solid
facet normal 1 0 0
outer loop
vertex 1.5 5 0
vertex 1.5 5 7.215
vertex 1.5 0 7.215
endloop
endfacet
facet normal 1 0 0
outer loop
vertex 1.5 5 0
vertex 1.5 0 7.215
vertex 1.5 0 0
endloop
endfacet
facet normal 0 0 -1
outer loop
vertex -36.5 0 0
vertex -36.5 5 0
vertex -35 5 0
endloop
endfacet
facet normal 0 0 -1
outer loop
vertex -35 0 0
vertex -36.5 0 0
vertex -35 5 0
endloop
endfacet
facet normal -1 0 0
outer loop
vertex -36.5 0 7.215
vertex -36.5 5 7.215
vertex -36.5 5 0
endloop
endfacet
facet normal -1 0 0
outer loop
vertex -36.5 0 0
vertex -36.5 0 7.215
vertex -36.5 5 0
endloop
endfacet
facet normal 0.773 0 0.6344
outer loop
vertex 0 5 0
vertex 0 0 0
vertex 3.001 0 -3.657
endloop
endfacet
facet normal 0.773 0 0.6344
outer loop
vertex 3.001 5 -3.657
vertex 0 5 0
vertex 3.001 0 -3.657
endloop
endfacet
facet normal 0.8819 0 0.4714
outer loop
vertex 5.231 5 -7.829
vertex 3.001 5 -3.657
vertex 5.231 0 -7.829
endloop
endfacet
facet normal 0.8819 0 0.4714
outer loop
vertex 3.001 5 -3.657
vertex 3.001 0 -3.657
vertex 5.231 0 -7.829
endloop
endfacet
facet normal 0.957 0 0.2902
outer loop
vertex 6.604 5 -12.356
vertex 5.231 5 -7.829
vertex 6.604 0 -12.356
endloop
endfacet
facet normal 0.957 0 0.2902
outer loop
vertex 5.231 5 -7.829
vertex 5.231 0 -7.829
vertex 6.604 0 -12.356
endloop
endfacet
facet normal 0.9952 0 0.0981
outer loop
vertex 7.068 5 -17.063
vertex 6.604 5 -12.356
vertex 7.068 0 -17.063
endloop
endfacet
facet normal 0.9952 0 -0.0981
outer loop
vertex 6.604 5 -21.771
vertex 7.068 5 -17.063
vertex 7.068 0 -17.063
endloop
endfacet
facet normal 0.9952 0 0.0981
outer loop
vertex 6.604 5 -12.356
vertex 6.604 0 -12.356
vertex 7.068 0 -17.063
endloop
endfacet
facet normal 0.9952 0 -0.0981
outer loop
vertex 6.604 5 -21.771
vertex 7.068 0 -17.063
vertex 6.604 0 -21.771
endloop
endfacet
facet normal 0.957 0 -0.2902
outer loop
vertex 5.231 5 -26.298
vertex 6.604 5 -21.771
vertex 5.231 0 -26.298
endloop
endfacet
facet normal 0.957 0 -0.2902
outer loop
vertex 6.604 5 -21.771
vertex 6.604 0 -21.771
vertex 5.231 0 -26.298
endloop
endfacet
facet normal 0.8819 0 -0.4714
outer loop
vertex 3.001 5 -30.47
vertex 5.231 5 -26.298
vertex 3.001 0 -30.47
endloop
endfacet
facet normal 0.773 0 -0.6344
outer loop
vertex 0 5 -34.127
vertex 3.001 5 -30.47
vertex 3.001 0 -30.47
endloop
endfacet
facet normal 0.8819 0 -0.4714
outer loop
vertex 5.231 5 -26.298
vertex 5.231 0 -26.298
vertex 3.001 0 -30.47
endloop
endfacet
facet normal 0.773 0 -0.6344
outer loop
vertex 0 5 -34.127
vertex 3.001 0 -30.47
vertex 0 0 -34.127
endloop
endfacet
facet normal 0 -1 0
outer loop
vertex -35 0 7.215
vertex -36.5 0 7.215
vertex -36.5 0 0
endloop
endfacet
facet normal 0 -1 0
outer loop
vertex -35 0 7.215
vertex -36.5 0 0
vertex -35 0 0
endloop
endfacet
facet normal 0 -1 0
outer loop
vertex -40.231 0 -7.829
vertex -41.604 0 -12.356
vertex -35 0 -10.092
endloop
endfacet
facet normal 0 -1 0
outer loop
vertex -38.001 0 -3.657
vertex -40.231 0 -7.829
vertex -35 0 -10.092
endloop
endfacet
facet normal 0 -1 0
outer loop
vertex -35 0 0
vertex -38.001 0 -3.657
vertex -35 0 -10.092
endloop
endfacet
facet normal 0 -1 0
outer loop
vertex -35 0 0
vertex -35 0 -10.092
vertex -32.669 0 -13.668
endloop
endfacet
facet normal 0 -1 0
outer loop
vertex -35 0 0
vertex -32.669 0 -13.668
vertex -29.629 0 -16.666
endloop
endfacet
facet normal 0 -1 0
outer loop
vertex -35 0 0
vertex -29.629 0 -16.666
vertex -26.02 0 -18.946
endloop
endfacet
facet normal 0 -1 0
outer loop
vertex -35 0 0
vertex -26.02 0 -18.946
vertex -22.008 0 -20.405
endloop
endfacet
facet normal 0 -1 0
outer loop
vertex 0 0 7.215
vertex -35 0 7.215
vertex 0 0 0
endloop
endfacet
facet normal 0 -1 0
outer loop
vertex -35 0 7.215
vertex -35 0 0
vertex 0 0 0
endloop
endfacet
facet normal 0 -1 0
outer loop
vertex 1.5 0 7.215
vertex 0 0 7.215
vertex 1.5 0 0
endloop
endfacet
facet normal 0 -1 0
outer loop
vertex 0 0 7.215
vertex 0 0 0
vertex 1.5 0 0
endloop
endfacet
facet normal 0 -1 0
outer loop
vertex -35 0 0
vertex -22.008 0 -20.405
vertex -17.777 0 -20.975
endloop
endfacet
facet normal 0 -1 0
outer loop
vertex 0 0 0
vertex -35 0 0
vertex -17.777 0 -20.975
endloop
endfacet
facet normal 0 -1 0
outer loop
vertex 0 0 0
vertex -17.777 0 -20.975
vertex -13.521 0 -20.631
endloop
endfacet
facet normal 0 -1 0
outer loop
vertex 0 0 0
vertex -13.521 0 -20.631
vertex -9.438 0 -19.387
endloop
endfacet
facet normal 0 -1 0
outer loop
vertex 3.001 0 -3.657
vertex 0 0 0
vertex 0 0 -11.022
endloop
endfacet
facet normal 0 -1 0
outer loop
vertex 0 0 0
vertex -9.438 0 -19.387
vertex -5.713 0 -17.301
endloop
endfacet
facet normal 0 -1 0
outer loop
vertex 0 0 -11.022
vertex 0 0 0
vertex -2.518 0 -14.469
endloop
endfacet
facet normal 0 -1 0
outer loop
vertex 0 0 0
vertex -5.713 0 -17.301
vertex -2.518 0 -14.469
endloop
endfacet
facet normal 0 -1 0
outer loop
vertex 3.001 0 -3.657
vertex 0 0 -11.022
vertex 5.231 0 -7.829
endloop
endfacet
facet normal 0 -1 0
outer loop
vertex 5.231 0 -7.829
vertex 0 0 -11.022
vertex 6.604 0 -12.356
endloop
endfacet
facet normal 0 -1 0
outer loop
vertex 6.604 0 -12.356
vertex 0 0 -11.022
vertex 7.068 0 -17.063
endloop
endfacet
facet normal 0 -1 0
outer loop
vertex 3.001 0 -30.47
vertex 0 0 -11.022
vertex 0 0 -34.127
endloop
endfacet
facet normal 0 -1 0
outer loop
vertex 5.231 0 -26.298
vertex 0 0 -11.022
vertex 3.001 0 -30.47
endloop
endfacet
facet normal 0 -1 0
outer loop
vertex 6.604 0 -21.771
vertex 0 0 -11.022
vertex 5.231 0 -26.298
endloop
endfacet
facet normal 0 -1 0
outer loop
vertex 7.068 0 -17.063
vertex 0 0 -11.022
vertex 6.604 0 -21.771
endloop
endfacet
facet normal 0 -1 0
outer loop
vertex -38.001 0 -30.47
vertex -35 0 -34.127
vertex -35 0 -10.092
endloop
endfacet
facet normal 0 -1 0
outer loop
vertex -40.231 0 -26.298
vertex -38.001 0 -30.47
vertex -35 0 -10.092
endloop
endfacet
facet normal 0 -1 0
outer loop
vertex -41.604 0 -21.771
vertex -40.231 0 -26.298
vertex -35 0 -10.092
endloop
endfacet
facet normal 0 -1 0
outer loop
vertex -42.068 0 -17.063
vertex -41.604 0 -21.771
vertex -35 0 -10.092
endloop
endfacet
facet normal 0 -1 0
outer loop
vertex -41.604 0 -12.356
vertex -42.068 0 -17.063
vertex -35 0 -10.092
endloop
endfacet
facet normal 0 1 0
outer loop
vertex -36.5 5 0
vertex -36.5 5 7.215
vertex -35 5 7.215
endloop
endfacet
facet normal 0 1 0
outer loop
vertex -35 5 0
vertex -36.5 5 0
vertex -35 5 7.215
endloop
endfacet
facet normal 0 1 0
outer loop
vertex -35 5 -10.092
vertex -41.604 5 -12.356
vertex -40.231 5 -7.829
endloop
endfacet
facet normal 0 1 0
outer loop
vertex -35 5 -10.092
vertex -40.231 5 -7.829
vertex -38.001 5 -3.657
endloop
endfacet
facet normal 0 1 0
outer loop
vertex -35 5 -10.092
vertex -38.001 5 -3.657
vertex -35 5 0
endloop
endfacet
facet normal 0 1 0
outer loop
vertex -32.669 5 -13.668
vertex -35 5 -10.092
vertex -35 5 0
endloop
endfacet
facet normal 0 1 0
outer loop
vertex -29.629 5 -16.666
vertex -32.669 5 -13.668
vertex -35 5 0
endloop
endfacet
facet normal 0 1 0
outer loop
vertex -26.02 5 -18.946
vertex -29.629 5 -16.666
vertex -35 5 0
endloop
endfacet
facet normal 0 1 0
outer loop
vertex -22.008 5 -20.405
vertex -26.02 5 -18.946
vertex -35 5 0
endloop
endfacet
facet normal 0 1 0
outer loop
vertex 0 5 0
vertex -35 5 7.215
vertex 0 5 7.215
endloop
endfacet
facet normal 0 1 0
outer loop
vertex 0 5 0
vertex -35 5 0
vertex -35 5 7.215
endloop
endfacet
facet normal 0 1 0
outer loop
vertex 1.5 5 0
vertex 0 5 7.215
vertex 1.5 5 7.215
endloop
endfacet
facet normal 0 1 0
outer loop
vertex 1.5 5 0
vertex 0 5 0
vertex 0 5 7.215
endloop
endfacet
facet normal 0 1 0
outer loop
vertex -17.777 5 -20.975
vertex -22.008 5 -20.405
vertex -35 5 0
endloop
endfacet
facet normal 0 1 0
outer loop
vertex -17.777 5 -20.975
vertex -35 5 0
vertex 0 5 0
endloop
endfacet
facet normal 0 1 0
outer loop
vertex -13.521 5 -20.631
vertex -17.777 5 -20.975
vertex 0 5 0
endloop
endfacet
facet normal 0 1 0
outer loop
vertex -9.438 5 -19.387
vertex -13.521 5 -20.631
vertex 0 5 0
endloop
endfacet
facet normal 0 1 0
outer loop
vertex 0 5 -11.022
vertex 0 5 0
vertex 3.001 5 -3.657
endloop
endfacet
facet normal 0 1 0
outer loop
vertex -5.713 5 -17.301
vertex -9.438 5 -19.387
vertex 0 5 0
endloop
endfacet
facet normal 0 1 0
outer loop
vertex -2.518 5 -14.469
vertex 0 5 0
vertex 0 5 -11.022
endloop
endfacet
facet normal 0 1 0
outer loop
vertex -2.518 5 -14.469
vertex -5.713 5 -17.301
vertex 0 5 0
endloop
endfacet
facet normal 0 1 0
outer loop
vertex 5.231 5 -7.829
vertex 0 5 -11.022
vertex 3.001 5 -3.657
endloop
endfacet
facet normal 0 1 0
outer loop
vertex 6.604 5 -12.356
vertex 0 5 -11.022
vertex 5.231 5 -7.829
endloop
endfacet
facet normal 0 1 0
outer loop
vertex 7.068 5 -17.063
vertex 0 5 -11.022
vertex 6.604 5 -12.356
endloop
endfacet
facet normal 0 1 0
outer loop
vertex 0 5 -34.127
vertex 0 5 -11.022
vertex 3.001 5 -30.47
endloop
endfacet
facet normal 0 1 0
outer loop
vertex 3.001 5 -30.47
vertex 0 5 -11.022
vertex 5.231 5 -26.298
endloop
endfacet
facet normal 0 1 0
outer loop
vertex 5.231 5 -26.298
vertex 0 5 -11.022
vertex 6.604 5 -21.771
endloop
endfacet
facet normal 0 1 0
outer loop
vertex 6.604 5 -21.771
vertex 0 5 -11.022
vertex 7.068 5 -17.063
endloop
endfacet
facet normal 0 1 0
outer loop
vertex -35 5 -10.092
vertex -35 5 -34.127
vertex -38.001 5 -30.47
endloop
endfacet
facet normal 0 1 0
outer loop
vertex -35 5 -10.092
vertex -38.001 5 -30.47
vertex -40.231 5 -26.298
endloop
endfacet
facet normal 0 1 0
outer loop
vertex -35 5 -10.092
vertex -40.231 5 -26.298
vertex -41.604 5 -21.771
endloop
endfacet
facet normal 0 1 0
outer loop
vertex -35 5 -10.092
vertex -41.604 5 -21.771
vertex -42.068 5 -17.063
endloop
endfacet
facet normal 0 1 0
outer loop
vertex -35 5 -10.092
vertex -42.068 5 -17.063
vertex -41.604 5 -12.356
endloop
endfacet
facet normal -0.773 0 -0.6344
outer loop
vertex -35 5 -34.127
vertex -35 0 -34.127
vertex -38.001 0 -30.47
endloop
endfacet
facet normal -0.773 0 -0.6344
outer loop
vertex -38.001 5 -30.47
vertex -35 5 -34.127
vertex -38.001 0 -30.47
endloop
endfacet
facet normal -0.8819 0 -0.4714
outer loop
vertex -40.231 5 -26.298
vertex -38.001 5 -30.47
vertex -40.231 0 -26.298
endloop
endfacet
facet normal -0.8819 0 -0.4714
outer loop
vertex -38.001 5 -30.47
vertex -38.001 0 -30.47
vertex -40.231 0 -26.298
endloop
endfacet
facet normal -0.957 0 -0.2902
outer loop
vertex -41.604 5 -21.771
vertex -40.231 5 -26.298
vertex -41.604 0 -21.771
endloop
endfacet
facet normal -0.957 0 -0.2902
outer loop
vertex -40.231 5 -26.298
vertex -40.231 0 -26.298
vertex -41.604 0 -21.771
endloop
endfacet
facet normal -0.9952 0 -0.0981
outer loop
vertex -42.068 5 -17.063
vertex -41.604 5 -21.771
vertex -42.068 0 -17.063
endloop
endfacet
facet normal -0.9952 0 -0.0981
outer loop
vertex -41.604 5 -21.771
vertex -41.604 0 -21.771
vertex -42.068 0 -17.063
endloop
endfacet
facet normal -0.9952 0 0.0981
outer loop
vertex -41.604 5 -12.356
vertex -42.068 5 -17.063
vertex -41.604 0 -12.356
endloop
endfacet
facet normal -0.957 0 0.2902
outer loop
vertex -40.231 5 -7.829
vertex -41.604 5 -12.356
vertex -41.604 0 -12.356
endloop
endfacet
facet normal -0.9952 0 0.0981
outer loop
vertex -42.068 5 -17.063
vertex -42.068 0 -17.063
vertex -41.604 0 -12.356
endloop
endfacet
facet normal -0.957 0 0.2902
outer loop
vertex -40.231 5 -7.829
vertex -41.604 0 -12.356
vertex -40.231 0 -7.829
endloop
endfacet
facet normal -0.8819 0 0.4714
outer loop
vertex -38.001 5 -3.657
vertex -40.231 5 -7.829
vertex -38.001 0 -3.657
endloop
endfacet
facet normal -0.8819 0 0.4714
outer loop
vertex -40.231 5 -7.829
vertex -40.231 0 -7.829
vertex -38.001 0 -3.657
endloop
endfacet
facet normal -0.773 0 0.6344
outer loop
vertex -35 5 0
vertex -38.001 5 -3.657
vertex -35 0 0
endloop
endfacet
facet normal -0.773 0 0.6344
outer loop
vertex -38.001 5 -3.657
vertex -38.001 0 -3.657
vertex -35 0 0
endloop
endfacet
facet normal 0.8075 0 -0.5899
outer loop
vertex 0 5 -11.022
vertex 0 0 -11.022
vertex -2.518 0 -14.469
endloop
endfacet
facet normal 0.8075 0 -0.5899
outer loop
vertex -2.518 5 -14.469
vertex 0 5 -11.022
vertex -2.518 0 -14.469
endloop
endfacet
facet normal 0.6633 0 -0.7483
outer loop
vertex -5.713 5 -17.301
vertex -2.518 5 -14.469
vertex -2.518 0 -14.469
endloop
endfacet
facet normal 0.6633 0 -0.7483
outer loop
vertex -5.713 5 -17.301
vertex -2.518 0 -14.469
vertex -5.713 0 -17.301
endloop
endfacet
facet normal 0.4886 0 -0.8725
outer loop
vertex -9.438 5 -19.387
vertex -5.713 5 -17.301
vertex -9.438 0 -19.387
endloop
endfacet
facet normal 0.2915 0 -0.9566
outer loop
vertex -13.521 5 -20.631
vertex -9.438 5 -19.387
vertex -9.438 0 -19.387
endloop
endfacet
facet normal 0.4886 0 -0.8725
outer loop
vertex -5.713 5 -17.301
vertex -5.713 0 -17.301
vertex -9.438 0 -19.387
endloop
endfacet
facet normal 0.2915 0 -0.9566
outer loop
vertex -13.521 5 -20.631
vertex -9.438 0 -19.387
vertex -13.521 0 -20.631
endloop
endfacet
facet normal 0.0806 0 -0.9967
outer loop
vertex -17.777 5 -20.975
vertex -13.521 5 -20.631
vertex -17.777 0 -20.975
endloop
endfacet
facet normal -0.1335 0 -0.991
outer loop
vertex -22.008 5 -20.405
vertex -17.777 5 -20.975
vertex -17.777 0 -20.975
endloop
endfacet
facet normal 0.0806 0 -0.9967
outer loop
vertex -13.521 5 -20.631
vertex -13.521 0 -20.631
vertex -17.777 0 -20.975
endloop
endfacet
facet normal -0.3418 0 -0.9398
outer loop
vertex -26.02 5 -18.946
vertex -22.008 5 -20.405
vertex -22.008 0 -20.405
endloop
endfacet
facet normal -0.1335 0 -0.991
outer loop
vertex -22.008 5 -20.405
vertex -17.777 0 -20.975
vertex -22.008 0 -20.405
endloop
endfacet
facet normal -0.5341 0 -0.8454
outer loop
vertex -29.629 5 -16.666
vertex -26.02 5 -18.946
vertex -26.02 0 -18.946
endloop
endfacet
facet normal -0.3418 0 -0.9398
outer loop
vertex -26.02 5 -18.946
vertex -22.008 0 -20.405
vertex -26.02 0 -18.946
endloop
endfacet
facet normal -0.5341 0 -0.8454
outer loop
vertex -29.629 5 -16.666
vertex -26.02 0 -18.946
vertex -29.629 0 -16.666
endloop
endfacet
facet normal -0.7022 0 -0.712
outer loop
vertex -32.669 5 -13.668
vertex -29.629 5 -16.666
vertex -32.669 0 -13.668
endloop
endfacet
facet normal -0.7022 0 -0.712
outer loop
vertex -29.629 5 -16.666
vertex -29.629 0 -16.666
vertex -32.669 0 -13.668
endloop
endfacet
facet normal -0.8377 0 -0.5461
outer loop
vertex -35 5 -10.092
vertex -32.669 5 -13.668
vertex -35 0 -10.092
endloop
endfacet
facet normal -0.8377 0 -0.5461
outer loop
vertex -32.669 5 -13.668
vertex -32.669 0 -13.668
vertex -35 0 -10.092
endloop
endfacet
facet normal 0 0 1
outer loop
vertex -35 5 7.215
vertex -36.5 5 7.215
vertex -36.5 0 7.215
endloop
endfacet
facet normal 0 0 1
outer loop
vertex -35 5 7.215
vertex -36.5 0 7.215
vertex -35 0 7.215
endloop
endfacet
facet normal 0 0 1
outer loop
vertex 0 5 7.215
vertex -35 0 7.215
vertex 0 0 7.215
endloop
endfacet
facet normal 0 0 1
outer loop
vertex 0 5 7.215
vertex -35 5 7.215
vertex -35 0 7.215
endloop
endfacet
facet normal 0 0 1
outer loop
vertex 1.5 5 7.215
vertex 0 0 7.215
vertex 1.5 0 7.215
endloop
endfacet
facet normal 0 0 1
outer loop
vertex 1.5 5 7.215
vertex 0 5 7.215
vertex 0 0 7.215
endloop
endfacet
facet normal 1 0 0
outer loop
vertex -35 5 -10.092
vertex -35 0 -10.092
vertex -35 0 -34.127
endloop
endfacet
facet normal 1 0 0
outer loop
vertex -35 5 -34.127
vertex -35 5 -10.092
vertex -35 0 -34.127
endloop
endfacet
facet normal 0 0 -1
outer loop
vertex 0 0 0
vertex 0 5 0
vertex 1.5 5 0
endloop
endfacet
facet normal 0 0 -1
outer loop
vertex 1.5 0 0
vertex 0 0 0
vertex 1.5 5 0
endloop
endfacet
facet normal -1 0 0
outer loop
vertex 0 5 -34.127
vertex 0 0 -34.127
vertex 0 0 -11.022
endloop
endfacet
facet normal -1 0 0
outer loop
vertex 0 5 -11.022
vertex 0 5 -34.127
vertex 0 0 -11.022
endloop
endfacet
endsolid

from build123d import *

# Parameters (mm, degrees)
BOSS_EXTRUDE2_DEPTH = 5
BOSS_EXTRUDE3_START = -5
BOSS_EXTRUDE3_DEPTH = 5
SKETCH5_W           = 1.5
SKETCH5_H           = 7.215071269
BOSS_EXTRUDE4_DEPTH = 5


with BuildPart() as part:
    # Sketch1 → Boss-Extrude2 (new body)
    with BuildSketch(Plane(origin=(0, 0, 0), x_dir=(1, 0, 0), z_dir=(0, 1, 0))):
        with BuildLine():
            Line((-35, 10.092006525), (-35, 34.126916803))
            ThreePointArc((-35, 34.126916803), (-42.067915891, 17.063458401), (-35, 0))
            ThreePointArc((-35, 0), (-17.5, -2.732905818), (0, 0))
            ThreePointArc((0, 0), (7.067915891, 17.063458401), (0, 34.126916803))
            Line((0, 34.126916803), (0, 11.021533442))
            ThreePointArc((0, 11.021533442), (-17.776697358, 20.975411278), (-35, 10.092006525))
        make_face()
    extrude(amount=BOSS_EXTRUDE2_DEPTH)

    # Sketch4 → Boss-Extrude3 (add)
    with BuildSketch(Plane(origin=(0, 5, 0), x_dir=(1, 0, 0), z_dir=(0, 1, 0)).offset(BOSS_EXTRUDE3_START)):
        with BuildLine():
            Line((0, 0), (0, -7.215071269))
            Line((0, -7.215071269), (-35, -7.215071269))
            Line((-35, -7.215071269), (-35, 0))
            ThreePointArc((-35, 0), (-42.067915891, 17.063458401), (-35, 34.126916803))
            Line((-35, 34.126916803), (-35, 10.092006525))
            ThreePointArc((-35, 10.092006525), (-17.776697358, 20.975411278), (0, 11.021533442))
            Line((0, 11.021533442), (0, 34.126916803))
            ThreePointArc((0, 34.126916803), (7.067915891, 17.063458401), (0, 0))
        make_face()
    extrude(amount=BOSS_EXTRUDE3_DEPTH)

    # Sketch5 → Boss-Extrude4 (add)
    with BuildSketch(Plane(origin=(0, 5, 0), x_dir=(1, 0, 0), z_dir=(0, 1, 0))):
        with Locations((-35.75, -3.607535635)):
            Rectangle(SKETCH5_W, SKETCH5_H)
        with Locations((0.75, -3.607535635)):
            Rectangle(SKETCH5_W, SKETCH5_H)
    extrude(amount=-BOSS_EXTRUDE4_DEPTH)


solid = part.part
